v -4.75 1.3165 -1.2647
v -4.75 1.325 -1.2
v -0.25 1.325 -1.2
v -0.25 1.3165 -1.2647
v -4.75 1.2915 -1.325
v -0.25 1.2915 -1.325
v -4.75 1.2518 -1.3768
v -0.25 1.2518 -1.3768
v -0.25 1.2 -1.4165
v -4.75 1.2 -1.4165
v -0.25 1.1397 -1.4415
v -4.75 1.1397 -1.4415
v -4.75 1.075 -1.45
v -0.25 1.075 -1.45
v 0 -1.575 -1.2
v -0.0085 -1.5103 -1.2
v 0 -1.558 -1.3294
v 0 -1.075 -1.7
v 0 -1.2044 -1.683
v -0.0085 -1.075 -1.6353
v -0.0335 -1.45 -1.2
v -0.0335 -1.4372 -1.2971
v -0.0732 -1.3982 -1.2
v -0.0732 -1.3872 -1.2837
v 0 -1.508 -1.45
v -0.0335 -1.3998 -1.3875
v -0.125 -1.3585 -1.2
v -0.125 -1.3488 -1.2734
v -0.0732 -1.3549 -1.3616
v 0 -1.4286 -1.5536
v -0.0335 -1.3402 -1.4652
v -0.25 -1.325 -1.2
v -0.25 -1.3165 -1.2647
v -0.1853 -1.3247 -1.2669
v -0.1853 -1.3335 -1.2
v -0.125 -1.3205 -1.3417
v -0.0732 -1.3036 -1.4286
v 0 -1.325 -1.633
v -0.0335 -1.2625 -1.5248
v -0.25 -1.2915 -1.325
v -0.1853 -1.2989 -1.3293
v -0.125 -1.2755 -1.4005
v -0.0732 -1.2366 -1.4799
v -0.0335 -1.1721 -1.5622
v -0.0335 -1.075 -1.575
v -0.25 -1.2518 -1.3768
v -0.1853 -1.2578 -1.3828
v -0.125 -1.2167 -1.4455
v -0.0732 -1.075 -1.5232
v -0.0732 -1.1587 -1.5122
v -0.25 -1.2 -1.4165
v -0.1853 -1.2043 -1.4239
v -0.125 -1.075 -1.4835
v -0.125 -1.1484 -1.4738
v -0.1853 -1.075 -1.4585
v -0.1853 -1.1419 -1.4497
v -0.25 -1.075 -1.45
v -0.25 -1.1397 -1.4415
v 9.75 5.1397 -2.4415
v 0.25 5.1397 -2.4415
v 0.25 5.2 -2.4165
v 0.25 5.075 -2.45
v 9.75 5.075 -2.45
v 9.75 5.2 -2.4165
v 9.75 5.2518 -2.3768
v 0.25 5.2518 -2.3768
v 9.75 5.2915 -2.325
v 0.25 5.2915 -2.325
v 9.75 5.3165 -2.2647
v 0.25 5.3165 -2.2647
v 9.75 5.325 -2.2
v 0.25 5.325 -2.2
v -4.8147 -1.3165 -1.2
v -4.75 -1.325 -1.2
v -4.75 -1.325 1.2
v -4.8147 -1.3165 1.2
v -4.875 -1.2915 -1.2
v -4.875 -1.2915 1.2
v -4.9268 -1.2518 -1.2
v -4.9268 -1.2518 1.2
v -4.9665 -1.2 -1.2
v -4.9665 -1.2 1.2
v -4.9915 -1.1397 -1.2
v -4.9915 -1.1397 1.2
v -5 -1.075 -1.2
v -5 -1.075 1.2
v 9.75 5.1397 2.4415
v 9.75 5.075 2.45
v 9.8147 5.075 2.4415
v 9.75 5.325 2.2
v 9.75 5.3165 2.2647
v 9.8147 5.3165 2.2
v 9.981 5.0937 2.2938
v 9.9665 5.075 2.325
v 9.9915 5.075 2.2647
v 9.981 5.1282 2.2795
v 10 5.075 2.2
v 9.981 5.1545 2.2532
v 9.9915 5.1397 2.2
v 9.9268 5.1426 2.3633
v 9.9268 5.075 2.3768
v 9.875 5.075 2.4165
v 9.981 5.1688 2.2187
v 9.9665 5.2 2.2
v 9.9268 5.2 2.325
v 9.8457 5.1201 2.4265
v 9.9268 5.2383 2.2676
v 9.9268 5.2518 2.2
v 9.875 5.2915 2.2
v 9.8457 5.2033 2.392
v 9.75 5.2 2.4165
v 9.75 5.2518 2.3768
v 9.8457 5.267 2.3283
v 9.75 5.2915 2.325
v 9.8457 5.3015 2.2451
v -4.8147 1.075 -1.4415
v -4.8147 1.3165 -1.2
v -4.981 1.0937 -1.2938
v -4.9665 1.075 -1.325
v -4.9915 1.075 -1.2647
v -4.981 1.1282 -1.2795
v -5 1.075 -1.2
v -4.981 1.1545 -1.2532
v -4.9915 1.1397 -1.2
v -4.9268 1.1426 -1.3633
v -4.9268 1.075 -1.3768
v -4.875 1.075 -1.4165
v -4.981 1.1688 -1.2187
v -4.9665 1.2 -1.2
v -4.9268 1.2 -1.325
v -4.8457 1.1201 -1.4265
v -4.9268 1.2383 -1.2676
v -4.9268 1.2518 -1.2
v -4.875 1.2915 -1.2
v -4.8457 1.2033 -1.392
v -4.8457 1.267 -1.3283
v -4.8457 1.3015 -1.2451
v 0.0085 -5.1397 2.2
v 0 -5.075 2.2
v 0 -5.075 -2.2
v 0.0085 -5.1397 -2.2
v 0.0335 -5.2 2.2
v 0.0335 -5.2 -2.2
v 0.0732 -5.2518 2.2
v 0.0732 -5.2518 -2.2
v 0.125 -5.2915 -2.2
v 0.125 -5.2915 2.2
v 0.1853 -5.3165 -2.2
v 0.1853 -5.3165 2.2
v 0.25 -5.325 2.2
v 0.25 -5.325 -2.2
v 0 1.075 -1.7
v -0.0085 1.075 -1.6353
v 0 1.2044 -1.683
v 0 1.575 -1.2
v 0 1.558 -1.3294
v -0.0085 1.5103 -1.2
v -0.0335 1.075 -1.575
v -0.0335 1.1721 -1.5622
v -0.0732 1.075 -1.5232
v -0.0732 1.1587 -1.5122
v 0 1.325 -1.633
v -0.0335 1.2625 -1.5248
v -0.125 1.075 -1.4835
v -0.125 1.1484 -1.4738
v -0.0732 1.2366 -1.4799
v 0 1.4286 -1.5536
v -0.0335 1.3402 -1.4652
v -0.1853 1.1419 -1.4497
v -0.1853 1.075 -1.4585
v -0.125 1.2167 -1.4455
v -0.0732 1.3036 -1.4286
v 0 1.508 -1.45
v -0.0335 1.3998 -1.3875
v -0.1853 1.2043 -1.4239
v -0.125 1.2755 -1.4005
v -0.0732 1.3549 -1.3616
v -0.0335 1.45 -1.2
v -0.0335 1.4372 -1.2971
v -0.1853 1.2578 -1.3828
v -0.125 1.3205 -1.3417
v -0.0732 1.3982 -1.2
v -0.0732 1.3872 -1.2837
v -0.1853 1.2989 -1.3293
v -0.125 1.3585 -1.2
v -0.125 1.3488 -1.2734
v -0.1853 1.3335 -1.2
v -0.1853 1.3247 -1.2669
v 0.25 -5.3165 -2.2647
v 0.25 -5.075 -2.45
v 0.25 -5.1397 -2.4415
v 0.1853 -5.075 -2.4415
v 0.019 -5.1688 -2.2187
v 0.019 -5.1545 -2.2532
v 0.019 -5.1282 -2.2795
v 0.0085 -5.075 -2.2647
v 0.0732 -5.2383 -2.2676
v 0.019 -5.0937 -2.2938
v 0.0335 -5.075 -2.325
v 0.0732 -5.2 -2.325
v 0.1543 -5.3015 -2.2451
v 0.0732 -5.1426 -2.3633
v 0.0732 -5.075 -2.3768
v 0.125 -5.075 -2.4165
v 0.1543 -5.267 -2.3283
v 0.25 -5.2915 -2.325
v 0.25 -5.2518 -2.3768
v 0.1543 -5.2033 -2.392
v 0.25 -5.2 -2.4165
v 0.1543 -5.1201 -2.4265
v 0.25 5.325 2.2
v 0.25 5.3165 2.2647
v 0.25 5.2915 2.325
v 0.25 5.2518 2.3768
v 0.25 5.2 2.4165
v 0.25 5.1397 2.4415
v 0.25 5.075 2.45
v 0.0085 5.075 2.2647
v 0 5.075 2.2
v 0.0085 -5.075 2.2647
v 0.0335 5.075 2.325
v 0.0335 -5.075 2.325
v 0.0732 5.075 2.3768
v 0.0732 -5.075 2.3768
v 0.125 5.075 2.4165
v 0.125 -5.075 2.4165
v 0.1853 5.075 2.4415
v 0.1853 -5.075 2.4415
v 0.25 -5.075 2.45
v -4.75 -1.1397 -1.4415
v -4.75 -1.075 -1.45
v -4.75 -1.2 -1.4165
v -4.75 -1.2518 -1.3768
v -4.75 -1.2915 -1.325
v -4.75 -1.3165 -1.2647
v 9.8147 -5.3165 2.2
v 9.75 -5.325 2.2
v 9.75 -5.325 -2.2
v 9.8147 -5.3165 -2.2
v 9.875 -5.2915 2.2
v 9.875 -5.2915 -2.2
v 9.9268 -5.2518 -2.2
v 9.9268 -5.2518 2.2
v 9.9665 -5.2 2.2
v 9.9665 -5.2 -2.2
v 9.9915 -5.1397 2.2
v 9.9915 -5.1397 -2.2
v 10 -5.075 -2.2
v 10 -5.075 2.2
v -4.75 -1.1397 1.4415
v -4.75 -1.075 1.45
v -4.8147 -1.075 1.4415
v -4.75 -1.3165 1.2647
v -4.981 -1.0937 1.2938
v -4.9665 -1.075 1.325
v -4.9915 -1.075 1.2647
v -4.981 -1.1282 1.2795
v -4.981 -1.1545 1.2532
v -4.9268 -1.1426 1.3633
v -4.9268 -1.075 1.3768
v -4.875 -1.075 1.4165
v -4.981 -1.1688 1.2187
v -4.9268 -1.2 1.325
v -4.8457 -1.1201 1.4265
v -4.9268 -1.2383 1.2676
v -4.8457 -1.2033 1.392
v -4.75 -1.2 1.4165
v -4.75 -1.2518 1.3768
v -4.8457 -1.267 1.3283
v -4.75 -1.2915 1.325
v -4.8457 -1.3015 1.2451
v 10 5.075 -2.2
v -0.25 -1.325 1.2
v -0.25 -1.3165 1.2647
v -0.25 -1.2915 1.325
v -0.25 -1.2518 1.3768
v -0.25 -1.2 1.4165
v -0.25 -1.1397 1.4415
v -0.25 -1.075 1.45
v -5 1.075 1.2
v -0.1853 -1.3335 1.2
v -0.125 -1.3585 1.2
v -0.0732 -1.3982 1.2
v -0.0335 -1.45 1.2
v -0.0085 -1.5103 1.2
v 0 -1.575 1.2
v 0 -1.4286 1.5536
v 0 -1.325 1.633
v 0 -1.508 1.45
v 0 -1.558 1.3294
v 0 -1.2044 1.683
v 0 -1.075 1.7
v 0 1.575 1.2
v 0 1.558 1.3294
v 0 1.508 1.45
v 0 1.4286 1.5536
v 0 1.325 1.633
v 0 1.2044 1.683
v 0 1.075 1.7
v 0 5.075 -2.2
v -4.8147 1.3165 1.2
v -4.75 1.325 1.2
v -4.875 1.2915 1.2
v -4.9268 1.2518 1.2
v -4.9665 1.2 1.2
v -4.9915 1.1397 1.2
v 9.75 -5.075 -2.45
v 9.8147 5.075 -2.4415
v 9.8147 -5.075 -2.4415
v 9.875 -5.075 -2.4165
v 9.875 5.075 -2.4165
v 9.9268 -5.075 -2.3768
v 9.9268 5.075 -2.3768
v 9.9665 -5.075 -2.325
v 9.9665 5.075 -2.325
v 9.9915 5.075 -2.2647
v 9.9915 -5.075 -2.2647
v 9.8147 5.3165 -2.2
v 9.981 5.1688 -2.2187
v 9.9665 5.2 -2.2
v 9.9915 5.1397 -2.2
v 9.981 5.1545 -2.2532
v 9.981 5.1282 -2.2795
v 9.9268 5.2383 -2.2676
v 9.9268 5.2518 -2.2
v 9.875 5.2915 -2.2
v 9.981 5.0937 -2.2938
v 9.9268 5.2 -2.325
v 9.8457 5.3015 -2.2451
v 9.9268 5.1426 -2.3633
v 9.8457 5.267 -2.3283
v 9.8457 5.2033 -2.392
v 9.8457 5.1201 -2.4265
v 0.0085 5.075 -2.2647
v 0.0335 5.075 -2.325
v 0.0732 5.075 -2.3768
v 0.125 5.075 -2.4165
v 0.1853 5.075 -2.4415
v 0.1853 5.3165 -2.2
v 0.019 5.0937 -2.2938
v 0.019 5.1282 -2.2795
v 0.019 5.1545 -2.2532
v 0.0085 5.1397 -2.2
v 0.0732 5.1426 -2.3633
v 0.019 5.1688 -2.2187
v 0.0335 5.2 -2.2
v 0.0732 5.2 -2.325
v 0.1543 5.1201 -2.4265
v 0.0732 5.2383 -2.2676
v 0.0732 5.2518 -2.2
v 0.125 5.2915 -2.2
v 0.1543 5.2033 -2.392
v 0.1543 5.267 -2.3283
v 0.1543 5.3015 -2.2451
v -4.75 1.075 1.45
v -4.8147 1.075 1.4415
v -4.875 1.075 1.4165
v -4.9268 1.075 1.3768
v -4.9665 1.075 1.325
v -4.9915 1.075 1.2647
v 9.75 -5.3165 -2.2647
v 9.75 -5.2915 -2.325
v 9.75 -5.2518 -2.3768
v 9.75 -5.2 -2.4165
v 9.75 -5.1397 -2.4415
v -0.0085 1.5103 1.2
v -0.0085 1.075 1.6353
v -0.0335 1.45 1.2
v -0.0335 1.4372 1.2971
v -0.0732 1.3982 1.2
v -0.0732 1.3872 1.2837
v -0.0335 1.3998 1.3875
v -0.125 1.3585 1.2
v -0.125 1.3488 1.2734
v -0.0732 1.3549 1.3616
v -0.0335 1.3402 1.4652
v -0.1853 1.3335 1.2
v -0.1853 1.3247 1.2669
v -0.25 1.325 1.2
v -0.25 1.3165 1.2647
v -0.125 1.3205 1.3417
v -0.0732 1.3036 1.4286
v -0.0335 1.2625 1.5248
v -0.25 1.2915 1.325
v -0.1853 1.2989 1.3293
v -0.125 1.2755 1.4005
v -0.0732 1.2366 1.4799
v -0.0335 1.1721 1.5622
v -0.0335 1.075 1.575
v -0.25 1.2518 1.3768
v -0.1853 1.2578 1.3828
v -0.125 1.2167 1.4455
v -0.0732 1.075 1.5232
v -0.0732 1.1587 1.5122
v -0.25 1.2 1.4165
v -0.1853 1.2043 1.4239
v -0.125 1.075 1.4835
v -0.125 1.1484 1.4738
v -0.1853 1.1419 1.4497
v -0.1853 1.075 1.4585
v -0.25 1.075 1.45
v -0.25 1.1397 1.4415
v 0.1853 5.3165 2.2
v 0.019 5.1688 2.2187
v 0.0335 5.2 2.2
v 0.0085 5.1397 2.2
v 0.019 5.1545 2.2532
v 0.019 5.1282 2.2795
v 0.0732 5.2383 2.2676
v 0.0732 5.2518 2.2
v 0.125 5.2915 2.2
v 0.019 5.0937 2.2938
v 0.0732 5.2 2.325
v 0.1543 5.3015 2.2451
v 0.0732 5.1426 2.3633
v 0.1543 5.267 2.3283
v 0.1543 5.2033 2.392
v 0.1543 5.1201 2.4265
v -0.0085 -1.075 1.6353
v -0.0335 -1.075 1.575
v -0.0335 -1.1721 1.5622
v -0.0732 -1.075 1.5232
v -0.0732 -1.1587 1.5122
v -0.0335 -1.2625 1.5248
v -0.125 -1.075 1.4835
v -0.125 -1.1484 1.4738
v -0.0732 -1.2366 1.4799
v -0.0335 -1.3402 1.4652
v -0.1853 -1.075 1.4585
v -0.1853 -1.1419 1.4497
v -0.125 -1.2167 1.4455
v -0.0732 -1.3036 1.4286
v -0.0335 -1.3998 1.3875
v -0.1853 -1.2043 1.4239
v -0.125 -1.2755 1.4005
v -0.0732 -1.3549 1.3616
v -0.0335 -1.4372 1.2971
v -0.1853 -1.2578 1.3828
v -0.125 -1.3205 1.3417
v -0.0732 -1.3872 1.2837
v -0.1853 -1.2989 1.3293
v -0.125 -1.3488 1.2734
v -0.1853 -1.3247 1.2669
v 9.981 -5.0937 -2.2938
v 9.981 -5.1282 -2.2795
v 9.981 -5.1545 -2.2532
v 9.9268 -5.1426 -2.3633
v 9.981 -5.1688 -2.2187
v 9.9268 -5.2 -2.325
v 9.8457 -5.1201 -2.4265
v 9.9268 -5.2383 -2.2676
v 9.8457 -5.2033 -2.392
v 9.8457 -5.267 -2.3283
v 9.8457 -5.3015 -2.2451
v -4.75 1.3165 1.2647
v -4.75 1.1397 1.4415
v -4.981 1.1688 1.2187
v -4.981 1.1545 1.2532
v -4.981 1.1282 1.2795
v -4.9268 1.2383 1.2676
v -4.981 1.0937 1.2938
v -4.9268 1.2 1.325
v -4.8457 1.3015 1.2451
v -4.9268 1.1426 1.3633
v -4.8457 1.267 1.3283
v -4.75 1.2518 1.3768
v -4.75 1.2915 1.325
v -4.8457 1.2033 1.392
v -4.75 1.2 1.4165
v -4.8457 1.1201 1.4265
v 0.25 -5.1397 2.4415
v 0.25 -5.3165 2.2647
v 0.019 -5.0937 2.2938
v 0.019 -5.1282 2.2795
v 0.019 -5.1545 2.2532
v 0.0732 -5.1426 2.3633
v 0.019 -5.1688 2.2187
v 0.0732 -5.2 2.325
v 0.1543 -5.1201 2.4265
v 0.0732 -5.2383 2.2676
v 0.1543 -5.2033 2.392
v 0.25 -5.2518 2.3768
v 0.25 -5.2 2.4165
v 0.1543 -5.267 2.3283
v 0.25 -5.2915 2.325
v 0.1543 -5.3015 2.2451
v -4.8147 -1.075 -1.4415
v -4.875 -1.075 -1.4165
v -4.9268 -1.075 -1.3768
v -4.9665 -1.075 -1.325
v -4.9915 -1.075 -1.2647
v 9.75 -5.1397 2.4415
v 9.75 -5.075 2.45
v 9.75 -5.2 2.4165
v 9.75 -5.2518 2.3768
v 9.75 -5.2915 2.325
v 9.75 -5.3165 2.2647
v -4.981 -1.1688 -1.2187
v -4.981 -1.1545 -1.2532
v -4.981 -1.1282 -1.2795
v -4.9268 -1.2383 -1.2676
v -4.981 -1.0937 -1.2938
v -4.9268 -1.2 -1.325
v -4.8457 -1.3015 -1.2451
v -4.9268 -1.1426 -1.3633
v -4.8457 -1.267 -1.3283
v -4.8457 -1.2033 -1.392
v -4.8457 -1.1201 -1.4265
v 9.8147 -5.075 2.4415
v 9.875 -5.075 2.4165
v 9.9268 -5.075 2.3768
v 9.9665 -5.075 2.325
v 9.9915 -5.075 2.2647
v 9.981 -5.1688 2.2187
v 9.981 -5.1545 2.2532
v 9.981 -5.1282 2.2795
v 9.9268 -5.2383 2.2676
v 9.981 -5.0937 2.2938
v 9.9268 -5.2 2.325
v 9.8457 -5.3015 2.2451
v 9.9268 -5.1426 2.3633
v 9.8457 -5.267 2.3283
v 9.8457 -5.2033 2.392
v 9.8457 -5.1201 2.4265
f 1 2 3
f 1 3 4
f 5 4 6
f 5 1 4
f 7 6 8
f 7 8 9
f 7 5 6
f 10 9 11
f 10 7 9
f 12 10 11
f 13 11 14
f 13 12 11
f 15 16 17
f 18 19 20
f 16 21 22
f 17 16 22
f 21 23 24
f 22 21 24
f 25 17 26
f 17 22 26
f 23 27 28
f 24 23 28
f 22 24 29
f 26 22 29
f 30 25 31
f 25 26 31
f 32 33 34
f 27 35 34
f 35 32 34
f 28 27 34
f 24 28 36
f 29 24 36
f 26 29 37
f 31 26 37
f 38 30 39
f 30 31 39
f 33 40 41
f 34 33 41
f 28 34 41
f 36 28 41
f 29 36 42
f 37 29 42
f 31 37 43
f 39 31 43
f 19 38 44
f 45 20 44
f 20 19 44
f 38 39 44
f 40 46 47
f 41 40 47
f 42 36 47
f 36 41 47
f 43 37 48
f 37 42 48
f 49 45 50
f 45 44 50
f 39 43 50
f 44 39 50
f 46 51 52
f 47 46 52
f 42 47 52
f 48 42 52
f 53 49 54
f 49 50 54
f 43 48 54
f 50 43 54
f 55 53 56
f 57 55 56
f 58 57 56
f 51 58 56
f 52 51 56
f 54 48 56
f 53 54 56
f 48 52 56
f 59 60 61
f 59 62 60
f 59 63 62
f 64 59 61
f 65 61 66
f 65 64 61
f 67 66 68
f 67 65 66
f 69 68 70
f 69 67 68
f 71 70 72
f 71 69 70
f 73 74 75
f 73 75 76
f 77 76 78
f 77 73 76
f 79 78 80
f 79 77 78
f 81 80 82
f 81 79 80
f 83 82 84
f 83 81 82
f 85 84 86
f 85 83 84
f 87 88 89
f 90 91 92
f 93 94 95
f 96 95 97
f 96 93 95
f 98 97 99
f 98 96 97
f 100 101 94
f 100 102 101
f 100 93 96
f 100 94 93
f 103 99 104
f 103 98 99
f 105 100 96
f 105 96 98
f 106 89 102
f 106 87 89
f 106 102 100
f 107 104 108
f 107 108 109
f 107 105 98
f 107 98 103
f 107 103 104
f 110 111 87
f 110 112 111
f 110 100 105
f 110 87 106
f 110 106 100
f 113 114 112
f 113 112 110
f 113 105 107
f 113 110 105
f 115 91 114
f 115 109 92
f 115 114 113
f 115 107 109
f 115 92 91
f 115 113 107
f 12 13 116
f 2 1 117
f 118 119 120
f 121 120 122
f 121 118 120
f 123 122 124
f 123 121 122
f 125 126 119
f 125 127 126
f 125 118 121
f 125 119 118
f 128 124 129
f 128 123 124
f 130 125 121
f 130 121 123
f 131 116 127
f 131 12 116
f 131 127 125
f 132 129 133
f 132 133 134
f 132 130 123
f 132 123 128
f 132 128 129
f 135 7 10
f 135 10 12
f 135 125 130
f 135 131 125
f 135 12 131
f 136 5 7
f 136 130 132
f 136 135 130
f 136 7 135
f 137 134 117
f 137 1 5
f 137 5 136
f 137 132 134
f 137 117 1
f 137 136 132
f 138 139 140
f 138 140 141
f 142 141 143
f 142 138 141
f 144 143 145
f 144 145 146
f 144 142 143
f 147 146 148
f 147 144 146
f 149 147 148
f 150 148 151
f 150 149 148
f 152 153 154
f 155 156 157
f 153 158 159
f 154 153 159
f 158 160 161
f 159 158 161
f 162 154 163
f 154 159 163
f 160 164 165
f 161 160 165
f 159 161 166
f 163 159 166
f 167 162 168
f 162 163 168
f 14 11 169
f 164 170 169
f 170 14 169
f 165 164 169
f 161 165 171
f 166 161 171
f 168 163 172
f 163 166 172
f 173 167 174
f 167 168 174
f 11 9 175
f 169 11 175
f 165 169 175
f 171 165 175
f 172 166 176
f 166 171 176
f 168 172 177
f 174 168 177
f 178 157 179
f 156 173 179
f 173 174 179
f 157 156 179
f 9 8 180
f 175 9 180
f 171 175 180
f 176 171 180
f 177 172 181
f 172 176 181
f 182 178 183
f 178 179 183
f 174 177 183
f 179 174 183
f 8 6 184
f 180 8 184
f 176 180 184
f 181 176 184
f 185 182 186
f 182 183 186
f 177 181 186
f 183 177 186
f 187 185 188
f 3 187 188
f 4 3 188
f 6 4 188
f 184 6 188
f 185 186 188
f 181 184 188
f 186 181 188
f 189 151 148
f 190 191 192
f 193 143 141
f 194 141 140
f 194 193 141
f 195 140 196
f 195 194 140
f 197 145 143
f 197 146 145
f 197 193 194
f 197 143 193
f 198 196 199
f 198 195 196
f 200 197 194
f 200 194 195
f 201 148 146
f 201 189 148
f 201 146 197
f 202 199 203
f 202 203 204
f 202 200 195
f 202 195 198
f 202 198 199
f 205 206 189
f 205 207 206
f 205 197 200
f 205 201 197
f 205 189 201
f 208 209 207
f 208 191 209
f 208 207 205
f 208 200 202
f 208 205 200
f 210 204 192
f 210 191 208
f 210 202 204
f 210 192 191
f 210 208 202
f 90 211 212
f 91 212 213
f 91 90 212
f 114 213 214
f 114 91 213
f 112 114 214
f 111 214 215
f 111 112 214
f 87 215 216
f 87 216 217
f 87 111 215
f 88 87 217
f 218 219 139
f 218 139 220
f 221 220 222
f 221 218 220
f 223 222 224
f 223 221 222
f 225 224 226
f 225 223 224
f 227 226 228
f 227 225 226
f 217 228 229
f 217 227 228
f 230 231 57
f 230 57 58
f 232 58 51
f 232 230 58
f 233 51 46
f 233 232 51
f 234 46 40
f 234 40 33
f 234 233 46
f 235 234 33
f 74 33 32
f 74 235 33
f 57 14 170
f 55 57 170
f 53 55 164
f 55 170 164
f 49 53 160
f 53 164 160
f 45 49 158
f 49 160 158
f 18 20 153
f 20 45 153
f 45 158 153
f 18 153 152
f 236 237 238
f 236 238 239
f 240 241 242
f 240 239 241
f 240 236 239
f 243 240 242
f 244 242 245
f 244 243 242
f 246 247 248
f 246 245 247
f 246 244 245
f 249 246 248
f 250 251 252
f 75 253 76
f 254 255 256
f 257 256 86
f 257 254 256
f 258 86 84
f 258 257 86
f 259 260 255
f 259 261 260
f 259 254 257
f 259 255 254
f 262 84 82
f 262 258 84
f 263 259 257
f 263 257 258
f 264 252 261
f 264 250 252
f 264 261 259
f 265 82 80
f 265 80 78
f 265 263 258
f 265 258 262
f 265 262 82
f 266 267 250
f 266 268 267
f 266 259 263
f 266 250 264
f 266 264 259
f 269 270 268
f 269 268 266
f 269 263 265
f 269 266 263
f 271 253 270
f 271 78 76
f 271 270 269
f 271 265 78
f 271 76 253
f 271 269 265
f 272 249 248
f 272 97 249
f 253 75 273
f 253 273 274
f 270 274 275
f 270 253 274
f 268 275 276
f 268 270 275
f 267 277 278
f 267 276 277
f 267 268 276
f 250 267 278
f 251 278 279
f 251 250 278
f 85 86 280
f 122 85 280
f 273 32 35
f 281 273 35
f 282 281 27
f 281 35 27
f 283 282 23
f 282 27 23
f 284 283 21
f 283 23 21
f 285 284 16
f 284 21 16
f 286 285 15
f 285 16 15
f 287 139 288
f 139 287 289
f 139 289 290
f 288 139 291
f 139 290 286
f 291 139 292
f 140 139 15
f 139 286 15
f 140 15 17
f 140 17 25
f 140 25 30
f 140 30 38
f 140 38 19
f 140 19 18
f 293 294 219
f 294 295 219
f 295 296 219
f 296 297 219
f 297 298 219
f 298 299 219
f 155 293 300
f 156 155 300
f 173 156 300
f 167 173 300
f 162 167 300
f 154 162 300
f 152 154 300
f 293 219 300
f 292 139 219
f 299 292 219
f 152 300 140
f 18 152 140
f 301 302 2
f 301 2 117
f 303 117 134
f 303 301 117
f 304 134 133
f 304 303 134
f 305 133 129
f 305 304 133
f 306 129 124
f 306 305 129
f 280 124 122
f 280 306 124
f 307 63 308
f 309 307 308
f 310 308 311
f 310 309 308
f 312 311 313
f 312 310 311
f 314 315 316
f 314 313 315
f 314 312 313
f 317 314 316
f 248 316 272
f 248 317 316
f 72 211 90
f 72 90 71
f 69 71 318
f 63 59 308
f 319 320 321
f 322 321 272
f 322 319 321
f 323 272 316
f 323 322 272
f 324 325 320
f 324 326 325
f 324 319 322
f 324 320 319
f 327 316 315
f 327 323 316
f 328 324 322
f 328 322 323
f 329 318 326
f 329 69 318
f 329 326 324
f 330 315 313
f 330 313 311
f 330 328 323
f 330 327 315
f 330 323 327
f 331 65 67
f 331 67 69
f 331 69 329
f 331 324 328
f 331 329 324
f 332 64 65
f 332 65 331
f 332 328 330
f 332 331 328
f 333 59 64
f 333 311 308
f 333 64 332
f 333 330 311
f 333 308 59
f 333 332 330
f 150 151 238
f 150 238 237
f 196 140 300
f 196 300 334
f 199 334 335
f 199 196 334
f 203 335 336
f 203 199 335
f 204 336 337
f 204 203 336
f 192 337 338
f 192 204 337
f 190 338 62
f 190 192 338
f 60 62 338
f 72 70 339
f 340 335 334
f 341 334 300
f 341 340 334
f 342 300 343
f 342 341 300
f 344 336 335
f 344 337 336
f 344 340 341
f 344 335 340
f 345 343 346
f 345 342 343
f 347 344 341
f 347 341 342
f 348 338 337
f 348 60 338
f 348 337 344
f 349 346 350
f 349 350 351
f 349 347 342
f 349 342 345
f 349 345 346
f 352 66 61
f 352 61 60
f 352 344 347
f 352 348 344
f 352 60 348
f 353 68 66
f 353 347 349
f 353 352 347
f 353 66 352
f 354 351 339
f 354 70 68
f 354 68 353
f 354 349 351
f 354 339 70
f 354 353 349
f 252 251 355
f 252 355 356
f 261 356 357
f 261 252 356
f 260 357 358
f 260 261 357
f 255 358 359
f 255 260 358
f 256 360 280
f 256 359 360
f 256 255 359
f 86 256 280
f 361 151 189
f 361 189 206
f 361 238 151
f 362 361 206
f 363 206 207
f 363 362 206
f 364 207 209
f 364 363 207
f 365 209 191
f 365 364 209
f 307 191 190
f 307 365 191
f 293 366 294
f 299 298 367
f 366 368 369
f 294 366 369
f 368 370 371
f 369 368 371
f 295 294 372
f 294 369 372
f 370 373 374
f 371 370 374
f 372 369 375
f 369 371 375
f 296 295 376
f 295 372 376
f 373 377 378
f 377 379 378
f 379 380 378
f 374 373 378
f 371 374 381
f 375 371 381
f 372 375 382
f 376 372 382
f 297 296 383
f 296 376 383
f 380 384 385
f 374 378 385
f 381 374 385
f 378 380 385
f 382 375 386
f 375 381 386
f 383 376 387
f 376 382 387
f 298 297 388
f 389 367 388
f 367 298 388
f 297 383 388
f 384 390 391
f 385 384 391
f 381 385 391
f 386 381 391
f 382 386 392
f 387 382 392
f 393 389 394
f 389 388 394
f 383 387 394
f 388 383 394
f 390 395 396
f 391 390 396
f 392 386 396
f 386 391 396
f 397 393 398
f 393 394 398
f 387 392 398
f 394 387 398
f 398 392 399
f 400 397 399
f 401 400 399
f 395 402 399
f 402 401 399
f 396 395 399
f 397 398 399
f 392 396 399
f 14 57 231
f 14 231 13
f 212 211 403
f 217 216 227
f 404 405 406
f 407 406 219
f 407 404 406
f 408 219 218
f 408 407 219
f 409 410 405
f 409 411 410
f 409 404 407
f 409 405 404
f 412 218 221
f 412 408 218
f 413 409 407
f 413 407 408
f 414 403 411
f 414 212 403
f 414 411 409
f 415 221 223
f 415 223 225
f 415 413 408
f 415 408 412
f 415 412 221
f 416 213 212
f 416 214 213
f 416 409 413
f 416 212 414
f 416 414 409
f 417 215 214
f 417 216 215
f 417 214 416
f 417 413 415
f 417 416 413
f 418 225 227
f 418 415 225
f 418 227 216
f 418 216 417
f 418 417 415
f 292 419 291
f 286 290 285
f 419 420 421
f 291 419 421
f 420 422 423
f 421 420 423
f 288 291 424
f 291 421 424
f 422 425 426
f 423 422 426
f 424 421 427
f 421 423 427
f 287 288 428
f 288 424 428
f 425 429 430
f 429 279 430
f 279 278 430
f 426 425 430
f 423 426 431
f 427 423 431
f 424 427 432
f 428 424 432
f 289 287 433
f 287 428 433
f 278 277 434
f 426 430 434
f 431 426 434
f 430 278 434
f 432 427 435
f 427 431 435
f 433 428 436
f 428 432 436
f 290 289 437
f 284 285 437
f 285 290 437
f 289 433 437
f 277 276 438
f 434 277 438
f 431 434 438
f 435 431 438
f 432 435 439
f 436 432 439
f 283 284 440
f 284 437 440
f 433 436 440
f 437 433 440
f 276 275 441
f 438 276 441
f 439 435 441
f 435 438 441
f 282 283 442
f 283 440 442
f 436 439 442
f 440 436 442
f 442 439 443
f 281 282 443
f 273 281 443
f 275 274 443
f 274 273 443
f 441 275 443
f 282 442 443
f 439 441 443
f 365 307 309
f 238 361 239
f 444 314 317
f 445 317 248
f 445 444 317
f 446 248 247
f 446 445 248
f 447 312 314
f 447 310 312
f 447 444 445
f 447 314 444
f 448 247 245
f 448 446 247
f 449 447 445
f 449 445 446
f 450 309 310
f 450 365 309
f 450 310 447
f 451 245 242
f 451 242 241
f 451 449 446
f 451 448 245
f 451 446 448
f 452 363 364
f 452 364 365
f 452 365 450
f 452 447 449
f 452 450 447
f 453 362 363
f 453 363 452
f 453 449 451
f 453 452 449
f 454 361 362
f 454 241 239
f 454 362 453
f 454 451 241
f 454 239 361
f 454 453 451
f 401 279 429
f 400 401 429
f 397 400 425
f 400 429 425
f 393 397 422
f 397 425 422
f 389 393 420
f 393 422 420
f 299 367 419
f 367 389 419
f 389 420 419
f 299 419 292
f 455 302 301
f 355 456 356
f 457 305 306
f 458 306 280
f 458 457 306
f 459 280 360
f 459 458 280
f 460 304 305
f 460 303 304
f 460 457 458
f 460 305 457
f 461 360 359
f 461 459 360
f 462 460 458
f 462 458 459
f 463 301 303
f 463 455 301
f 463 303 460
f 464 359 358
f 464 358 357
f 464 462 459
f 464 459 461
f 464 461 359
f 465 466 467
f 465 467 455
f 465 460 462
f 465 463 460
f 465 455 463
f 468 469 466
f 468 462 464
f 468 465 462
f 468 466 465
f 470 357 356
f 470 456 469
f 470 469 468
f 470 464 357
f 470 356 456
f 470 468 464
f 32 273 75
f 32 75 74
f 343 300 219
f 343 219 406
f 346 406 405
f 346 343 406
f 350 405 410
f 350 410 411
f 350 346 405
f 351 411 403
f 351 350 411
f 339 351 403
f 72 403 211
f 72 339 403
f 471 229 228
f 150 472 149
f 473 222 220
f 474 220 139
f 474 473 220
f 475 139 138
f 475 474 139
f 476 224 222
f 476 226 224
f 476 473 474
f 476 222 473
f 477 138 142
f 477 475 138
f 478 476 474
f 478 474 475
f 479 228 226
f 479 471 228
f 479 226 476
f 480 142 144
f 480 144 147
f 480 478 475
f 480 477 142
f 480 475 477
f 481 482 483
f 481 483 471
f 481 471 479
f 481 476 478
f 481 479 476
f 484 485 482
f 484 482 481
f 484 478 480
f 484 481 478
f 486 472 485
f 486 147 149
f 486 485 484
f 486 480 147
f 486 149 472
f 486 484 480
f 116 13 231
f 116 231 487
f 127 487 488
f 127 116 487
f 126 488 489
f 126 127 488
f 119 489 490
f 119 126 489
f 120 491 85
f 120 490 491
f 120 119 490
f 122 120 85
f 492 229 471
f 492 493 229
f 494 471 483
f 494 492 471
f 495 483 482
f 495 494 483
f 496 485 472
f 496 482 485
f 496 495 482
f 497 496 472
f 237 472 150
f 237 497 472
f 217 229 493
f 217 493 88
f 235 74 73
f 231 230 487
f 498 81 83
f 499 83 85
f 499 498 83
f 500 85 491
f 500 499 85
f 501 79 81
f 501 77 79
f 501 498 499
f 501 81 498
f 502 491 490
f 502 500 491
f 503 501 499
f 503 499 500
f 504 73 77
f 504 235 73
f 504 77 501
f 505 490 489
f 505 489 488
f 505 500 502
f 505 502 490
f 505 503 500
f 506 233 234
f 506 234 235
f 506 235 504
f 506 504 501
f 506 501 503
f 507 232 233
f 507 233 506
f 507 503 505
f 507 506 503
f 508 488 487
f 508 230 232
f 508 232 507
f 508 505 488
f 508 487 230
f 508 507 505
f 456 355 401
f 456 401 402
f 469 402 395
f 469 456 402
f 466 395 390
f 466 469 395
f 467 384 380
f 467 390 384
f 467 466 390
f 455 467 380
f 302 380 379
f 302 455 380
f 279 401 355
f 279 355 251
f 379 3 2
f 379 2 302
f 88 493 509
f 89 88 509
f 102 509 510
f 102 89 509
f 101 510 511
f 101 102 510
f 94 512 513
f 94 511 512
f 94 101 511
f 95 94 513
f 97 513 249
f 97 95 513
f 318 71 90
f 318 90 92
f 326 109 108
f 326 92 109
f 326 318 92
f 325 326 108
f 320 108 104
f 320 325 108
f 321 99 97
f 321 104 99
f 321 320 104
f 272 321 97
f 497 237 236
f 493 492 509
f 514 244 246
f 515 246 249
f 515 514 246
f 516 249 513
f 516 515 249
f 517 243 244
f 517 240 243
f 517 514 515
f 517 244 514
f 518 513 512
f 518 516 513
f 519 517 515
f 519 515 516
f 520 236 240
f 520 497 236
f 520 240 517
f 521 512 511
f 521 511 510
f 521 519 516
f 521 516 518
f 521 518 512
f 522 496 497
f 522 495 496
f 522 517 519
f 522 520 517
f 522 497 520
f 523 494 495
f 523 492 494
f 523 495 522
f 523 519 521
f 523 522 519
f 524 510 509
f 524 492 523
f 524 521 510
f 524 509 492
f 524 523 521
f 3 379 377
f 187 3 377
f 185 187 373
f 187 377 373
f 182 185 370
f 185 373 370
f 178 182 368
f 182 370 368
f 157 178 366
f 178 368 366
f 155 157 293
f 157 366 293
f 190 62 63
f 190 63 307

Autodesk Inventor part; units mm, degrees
ref_plane "YZ Plane" through (0, 0, 0) normal (1, 0, 0) x (0, 1, 0)
ref_plane "XZ Plane" through (0, 0, 0) normal (0, 1, 0) x (-1, 0, 0)
ref_plane "XY Plane" through (0, 0, 0) normal (0, 0, 1) x (1, 0, 0)
sketch "Sketch1" plane through (0, 0, 0) normal (1, 0, 0) x (0, 1, 0)
  line L0 (1.325, 1.45) -> (-1.325, 1.45)
  line L1 (-1.325, 1.45) -> (-1.325, -1.45)
  line L2 (-1.325, -1.45) -> (1.325, -1.45)
  line L3 (1.325, -1.45) -> (1.325, 1.45)
  point P0 (0, 0)
  dimension "d0" = 2.9
  dimension "d1" = 2.65
  dimension "d2" = 1.45
  dimension "d3" = 1.325
extrude "Extrusion1" add sketch "Sketch1" against normal blind 5
sketch "Sketch2" plane through (0, 0, 0) normal (1, 0, 0) x (0, 0, -1)
  line L0 (-2.45, 5.325) -> (2.45, 5.325)
  line L1 (2.45, 5.325) -> (2.45, -5.325)
  line L2 (2.45, -5.325) -> (-2.45, -5.325)
  line L3 (-2.45, -5.325) -> (-2.45, 5.325)
  line L4 (-1.45, 1.325) -> (-1.45, -1.325) projected
  line L5 (1.45, -1.325) -> (1.45, 1.325) projected
  line L6 (1.45, 1.325) -> (-1.45, 1.325) projected
  line L7 (-1.45, -1.325) -> (1.45, -1.325) projected
  point P0 (0, 0)
  dimension "d6" = 1
  dimension "d7" = 1
  dimension "d8" = 4
  dimension "d9" = 4
extrude "Extrusion2" add sketch "Sketch2" along normal blind 10 contours L0 L1 L2 L3 | L6 L5 L7 L4
fillet "Fillet1" radius 0.25 24 edges at (5, 5.325, 2.45) (5, 5.325, -2.45) (5, -5.325, -2.45) (5, -5.325, 2.45) (10, -5.325, 0) (10, 0, 2.45) (10, 0, -2.45) (10, 5.325, 0) (0, 5.325, 0) (0, -5.325, 0) (0, 0, 2.45) (0, 0, -2.45) (-2.5, 1.325, -1.45) (-2.5, 1.325, 1.45) (-2.5, -1.325, -1.45) (-2.5, -1.325, 1.45) (0, 1.325, 0) (0, 0, 1.45) (0, 0, -1.45) (0, -1.325, 0) (-5, 0, 1.45) (-5, 1.325, 0) (-5, 0, -1.45) (-5, -1.325, 0)
properties part number "dual_slider_paddlew"
